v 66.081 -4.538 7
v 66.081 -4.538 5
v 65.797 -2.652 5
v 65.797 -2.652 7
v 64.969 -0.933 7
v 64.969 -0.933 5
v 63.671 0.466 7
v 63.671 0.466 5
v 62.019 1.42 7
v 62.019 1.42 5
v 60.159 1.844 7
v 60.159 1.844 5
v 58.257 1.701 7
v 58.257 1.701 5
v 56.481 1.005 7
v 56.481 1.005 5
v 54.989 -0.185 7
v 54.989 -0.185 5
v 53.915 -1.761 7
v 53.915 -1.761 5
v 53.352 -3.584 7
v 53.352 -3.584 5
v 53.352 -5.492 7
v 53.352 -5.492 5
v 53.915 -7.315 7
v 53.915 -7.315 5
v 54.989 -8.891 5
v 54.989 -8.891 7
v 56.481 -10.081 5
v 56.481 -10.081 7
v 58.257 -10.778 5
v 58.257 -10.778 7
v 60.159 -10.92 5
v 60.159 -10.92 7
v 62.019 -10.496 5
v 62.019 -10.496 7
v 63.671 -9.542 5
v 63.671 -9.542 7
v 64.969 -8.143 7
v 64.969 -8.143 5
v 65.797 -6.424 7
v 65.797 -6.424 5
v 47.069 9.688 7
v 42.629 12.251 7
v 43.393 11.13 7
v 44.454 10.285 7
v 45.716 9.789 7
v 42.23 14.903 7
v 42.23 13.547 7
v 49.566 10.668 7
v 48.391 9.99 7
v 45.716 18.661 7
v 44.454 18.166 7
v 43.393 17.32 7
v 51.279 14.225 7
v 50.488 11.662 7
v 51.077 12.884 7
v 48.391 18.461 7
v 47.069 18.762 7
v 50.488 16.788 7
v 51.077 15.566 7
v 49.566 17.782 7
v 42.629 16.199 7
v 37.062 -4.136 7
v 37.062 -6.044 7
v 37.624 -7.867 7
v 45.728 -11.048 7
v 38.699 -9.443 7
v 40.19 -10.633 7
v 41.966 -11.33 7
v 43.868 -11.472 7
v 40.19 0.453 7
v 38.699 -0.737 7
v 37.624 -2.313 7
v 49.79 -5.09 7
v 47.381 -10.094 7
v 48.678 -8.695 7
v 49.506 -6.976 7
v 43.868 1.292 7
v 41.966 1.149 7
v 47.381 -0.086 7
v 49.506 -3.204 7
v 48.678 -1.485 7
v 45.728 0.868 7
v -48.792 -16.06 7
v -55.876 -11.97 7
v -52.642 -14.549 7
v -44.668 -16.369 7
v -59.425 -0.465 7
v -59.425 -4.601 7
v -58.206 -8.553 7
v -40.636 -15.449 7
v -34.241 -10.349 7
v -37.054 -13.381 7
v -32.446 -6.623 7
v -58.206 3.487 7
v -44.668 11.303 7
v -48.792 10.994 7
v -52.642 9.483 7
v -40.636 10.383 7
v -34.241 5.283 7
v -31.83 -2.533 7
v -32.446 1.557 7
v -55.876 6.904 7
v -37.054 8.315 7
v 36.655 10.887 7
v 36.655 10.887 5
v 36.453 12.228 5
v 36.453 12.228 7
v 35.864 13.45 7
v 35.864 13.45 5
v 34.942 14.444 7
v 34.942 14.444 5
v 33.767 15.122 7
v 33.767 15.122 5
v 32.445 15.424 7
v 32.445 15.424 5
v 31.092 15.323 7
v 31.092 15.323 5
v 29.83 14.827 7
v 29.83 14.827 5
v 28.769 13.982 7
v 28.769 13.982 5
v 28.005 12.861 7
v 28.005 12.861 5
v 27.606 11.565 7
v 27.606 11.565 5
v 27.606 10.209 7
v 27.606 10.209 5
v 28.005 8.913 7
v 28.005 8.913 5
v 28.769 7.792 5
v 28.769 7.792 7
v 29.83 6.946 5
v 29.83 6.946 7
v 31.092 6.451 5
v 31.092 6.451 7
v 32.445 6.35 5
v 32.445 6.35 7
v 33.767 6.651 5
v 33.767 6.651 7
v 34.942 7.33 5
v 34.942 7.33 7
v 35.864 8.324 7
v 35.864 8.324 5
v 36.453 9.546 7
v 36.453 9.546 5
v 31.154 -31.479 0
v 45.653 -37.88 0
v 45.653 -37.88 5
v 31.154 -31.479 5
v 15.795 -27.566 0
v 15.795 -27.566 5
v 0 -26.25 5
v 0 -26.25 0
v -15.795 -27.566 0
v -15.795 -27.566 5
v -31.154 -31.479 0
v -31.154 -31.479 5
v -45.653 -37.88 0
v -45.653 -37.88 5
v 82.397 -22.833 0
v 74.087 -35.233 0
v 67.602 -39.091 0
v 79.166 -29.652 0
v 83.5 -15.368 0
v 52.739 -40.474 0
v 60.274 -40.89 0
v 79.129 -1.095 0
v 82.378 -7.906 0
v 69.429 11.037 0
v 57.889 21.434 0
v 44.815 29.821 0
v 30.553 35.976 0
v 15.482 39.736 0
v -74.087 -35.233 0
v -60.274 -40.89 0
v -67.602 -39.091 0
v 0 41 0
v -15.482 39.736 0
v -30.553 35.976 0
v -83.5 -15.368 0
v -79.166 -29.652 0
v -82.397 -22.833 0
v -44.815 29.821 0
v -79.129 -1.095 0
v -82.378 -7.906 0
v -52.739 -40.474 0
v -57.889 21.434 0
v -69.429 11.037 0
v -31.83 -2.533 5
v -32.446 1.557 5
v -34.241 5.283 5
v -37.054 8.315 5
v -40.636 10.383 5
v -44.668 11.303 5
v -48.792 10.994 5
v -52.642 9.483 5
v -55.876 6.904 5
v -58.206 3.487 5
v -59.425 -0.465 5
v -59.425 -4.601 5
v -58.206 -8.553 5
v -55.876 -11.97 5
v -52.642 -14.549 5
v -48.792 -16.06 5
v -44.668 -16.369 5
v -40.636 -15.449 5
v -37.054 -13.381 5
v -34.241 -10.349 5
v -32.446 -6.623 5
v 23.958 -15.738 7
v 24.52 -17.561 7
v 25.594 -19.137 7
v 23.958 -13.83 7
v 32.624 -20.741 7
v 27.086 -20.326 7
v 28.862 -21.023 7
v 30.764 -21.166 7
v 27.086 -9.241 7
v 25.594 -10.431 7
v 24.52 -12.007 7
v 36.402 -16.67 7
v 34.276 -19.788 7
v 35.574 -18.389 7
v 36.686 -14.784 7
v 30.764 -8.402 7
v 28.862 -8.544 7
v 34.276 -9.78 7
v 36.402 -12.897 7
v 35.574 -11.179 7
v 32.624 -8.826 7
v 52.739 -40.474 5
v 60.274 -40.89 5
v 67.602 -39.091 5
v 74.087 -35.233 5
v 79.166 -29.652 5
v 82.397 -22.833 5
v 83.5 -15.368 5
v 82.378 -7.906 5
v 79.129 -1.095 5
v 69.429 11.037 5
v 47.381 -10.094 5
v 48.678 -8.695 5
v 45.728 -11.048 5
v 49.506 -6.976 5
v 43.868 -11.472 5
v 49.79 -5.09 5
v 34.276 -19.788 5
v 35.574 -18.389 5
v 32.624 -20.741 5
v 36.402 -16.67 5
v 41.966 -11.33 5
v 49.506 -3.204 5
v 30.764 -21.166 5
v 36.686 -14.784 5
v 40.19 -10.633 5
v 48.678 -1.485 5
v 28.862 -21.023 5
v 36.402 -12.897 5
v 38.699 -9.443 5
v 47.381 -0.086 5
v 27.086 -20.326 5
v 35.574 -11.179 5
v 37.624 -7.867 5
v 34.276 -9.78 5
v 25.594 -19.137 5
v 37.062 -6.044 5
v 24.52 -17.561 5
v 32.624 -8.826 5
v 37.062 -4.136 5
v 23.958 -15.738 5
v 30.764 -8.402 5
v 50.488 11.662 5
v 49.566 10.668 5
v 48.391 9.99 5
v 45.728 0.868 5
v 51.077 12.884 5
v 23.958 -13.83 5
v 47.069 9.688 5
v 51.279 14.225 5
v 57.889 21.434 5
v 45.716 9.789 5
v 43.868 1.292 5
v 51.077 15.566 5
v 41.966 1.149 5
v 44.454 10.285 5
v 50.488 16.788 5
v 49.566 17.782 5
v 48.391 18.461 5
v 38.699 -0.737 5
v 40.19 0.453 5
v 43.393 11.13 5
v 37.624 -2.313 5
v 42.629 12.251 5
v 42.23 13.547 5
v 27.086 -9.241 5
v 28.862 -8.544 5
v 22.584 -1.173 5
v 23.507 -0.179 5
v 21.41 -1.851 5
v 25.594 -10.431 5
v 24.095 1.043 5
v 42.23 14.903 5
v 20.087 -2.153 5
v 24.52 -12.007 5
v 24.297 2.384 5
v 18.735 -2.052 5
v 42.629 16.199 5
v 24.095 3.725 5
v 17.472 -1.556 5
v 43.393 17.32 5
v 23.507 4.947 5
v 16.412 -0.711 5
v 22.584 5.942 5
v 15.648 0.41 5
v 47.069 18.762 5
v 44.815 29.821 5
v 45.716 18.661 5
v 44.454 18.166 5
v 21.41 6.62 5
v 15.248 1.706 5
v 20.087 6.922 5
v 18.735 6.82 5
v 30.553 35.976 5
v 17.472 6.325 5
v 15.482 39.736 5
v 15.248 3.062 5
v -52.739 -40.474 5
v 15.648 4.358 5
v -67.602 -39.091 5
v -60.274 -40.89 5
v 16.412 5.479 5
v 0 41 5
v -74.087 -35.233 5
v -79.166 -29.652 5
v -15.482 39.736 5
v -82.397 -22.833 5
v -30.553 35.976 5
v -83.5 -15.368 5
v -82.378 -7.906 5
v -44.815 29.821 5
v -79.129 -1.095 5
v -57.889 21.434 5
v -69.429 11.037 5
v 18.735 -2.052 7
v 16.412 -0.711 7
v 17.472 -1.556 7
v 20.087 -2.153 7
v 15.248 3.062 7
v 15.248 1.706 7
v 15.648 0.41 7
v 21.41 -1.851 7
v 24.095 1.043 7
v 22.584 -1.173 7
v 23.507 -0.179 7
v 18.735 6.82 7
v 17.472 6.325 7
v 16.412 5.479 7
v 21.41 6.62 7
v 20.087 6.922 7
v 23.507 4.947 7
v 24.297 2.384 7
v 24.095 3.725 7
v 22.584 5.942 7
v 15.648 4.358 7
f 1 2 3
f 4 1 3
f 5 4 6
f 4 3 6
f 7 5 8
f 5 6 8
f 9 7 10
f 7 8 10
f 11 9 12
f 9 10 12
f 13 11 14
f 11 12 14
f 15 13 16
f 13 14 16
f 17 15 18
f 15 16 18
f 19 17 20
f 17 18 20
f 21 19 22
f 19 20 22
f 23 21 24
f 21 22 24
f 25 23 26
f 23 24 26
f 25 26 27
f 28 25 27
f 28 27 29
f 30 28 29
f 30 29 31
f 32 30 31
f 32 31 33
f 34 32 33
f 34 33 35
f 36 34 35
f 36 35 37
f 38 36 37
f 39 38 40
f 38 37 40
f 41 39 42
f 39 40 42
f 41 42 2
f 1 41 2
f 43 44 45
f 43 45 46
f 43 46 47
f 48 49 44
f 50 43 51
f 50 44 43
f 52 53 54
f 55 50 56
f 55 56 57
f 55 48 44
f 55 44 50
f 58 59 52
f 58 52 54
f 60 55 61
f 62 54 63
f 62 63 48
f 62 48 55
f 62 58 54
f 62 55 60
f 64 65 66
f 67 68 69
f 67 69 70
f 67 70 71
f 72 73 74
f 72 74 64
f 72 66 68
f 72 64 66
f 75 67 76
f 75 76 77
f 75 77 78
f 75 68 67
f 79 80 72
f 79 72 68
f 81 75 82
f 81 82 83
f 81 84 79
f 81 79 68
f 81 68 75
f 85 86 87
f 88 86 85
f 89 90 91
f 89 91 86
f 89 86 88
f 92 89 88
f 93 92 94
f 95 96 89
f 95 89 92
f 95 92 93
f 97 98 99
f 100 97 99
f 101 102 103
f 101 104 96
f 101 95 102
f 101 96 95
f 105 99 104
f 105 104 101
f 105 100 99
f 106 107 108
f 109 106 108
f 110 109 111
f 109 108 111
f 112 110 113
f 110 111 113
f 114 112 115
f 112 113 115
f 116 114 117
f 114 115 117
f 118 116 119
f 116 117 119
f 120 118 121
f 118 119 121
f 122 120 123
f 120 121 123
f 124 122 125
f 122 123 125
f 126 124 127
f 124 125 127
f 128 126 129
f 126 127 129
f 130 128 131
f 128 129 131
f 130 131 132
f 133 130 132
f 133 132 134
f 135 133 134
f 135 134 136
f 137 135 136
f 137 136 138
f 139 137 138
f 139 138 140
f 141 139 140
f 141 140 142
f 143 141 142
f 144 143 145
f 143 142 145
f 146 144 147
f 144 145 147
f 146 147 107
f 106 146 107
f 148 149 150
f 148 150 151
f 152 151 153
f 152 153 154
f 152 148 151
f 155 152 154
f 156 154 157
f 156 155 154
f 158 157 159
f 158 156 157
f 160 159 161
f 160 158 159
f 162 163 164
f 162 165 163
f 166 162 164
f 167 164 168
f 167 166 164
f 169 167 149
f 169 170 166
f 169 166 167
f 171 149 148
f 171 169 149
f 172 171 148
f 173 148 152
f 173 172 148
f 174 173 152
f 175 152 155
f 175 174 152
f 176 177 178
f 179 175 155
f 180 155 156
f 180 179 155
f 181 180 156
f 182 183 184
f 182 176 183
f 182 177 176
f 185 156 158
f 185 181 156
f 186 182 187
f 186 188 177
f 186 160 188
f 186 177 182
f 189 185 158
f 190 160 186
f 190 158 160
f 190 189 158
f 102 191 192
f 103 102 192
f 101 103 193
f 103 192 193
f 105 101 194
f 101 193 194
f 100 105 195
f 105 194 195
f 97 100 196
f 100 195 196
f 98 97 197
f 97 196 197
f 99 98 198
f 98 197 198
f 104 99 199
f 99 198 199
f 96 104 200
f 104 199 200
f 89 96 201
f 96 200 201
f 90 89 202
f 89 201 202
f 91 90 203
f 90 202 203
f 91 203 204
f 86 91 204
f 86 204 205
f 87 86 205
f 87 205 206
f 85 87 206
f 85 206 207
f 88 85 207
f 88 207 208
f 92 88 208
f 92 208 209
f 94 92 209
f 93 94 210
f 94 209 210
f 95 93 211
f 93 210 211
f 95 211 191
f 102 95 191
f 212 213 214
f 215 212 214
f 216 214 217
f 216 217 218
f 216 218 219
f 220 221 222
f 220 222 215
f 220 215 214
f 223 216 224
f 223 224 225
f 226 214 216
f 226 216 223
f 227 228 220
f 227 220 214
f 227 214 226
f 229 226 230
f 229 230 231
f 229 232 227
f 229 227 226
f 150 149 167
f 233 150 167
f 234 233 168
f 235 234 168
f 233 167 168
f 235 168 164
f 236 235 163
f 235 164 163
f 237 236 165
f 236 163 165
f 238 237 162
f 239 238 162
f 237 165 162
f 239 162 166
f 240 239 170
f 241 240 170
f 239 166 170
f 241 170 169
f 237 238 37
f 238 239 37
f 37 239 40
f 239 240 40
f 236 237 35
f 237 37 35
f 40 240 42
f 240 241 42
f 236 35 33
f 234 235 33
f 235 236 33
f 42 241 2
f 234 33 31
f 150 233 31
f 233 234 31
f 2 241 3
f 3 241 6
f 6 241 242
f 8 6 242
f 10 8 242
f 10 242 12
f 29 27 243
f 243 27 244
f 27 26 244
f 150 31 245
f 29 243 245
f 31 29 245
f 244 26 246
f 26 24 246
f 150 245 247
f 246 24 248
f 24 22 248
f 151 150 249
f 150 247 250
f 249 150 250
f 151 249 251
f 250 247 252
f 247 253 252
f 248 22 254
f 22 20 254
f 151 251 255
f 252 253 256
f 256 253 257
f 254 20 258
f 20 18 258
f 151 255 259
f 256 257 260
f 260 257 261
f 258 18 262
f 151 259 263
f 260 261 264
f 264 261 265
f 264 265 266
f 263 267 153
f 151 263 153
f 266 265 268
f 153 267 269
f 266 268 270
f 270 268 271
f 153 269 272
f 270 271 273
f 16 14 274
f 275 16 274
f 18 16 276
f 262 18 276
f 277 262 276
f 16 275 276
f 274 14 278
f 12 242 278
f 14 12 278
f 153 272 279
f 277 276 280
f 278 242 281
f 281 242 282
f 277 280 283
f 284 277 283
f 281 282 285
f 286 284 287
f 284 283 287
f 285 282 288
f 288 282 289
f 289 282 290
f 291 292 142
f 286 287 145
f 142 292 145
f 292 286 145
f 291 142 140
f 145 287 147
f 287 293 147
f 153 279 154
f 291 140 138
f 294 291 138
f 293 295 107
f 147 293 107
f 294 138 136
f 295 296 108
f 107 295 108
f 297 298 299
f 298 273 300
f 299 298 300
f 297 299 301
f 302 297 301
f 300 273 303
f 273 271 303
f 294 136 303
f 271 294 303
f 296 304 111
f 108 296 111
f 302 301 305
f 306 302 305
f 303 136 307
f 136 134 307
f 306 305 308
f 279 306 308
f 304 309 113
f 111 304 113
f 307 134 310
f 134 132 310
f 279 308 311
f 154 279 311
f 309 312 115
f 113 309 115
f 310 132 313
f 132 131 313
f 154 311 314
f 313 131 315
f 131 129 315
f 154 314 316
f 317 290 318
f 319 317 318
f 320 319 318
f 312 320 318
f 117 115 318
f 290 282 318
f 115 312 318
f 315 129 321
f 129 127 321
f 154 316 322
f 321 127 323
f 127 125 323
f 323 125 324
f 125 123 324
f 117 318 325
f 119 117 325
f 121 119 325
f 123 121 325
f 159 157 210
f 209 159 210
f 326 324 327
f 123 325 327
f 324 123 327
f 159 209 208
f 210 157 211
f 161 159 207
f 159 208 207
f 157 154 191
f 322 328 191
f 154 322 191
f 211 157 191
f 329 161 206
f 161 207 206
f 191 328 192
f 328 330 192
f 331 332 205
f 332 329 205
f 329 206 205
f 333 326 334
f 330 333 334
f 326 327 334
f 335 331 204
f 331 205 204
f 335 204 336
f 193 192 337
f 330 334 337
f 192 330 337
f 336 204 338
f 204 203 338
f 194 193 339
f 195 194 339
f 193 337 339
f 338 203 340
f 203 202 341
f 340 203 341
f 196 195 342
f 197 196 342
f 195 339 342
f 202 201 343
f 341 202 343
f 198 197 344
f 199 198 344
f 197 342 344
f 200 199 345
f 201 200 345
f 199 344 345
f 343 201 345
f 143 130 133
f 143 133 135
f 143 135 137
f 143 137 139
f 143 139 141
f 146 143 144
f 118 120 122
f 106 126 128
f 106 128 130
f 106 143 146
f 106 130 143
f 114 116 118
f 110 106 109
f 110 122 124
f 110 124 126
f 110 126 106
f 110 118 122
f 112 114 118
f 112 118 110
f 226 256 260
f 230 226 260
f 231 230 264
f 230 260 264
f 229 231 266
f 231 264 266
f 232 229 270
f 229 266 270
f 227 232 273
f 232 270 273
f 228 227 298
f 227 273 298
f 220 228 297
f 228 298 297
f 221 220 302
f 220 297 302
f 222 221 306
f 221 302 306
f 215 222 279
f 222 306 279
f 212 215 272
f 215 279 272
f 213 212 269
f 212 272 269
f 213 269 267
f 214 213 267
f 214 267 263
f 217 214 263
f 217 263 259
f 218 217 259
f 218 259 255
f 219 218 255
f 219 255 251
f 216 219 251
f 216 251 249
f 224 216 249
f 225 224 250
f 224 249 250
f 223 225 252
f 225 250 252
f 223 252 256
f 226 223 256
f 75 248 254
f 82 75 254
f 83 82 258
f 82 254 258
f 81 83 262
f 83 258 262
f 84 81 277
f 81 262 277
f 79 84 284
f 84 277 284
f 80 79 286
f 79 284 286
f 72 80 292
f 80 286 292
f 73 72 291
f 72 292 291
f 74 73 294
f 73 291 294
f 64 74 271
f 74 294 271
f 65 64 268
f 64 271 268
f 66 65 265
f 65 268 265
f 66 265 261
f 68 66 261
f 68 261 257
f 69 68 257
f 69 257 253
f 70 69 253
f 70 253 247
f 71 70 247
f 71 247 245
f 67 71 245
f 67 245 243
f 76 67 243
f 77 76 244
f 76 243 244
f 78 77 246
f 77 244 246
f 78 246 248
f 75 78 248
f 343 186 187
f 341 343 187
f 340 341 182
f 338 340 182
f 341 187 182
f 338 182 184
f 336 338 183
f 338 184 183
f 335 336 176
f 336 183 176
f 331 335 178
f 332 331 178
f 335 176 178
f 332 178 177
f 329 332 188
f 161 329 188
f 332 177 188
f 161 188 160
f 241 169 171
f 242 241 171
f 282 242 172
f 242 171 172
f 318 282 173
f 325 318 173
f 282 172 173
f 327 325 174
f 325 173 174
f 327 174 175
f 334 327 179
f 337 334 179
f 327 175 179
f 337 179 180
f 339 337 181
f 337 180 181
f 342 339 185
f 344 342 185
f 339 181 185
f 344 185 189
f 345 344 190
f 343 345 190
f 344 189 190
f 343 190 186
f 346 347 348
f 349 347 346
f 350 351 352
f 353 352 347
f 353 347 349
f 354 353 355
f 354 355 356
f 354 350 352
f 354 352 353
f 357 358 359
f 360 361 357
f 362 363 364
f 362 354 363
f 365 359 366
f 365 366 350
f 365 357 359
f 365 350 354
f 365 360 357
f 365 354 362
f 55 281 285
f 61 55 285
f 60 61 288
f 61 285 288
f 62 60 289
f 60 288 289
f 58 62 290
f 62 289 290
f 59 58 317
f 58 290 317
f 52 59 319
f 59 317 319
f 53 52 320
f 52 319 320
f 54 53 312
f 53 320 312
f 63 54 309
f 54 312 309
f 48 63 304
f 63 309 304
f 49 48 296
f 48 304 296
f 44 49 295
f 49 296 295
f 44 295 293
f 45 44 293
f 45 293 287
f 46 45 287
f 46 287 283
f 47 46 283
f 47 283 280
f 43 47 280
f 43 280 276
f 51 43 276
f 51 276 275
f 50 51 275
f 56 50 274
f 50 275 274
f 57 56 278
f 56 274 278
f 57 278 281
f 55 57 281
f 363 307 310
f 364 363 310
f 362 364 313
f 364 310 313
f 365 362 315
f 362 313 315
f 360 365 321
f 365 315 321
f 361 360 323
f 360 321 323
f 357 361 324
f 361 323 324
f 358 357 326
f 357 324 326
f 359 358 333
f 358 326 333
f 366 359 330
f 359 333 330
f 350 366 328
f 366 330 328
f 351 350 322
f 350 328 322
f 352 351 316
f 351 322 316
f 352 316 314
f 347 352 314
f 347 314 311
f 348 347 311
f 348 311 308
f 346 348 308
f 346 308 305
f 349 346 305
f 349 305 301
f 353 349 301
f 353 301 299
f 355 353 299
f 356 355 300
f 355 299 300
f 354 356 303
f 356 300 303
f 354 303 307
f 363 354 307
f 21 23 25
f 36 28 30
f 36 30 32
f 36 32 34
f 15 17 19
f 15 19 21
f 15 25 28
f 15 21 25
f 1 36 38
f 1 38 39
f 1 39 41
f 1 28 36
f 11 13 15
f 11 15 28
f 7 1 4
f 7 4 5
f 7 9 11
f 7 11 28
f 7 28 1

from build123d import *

# Parameters (mm, degrees)
PAD_DEPTH     = 5
SKETCH001_R   = 13.875
SKETCH001_R_2 = 6.4
SKETCH001_R_3 = 4.55
PAD001_DEPTH  = 2


with BuildPart() as part:
    # Sketch → Pad (new body)
    with BuildSketch(Plane.XY):
        with BuildLine():
            ThreePointArc((45.653278, -37.879963), (0, -26.25), (-45.653278, -37.879963))
            ThreePointArc((-79.129462, -1.094945), (-76.833677, -32.630667), (-45.653278, -37.879963))
            ThreePointArc((79.129462, -1.094945), (0, 41), (-79.129462, -1.094945))
            ThreePointArc((45.653278, -37.879963), (76.833677, -32.630667), (79.129462, -1.094945))
        make_face()
    extrude(amount=PAD_DEPTH)

    # Sketch001 (on Face6 of Pad) → Pad001 (join)
    with BuildSketch(Plane.XY.offset(5)):
        with Locations((-45.704856, -2.533086)):
            Circle(SKETCH001_R)
        with Locations((30.286027, -14.783871)):
            Circle(SKETCH001_R_2)
        with Locations((43.390221, -5.090053)):
            Circle(SKETCH001_R_2)
        with Locations((59.680872, -4.538045)):
            Circle(SKETCH001_R_2)
        with Locations((19.747467, 2.384254)):
            Circle(SKETCH001_R_3)
        with Locations((32.104855, 10.886898)):
            Circle(SKETCH001_R_3)
        with Locations((46.728688, 14.225088)):
            Circle(SKETCH001_R_3)
    extrude(amount=PAD001_DEPTH)


solid = part.part
